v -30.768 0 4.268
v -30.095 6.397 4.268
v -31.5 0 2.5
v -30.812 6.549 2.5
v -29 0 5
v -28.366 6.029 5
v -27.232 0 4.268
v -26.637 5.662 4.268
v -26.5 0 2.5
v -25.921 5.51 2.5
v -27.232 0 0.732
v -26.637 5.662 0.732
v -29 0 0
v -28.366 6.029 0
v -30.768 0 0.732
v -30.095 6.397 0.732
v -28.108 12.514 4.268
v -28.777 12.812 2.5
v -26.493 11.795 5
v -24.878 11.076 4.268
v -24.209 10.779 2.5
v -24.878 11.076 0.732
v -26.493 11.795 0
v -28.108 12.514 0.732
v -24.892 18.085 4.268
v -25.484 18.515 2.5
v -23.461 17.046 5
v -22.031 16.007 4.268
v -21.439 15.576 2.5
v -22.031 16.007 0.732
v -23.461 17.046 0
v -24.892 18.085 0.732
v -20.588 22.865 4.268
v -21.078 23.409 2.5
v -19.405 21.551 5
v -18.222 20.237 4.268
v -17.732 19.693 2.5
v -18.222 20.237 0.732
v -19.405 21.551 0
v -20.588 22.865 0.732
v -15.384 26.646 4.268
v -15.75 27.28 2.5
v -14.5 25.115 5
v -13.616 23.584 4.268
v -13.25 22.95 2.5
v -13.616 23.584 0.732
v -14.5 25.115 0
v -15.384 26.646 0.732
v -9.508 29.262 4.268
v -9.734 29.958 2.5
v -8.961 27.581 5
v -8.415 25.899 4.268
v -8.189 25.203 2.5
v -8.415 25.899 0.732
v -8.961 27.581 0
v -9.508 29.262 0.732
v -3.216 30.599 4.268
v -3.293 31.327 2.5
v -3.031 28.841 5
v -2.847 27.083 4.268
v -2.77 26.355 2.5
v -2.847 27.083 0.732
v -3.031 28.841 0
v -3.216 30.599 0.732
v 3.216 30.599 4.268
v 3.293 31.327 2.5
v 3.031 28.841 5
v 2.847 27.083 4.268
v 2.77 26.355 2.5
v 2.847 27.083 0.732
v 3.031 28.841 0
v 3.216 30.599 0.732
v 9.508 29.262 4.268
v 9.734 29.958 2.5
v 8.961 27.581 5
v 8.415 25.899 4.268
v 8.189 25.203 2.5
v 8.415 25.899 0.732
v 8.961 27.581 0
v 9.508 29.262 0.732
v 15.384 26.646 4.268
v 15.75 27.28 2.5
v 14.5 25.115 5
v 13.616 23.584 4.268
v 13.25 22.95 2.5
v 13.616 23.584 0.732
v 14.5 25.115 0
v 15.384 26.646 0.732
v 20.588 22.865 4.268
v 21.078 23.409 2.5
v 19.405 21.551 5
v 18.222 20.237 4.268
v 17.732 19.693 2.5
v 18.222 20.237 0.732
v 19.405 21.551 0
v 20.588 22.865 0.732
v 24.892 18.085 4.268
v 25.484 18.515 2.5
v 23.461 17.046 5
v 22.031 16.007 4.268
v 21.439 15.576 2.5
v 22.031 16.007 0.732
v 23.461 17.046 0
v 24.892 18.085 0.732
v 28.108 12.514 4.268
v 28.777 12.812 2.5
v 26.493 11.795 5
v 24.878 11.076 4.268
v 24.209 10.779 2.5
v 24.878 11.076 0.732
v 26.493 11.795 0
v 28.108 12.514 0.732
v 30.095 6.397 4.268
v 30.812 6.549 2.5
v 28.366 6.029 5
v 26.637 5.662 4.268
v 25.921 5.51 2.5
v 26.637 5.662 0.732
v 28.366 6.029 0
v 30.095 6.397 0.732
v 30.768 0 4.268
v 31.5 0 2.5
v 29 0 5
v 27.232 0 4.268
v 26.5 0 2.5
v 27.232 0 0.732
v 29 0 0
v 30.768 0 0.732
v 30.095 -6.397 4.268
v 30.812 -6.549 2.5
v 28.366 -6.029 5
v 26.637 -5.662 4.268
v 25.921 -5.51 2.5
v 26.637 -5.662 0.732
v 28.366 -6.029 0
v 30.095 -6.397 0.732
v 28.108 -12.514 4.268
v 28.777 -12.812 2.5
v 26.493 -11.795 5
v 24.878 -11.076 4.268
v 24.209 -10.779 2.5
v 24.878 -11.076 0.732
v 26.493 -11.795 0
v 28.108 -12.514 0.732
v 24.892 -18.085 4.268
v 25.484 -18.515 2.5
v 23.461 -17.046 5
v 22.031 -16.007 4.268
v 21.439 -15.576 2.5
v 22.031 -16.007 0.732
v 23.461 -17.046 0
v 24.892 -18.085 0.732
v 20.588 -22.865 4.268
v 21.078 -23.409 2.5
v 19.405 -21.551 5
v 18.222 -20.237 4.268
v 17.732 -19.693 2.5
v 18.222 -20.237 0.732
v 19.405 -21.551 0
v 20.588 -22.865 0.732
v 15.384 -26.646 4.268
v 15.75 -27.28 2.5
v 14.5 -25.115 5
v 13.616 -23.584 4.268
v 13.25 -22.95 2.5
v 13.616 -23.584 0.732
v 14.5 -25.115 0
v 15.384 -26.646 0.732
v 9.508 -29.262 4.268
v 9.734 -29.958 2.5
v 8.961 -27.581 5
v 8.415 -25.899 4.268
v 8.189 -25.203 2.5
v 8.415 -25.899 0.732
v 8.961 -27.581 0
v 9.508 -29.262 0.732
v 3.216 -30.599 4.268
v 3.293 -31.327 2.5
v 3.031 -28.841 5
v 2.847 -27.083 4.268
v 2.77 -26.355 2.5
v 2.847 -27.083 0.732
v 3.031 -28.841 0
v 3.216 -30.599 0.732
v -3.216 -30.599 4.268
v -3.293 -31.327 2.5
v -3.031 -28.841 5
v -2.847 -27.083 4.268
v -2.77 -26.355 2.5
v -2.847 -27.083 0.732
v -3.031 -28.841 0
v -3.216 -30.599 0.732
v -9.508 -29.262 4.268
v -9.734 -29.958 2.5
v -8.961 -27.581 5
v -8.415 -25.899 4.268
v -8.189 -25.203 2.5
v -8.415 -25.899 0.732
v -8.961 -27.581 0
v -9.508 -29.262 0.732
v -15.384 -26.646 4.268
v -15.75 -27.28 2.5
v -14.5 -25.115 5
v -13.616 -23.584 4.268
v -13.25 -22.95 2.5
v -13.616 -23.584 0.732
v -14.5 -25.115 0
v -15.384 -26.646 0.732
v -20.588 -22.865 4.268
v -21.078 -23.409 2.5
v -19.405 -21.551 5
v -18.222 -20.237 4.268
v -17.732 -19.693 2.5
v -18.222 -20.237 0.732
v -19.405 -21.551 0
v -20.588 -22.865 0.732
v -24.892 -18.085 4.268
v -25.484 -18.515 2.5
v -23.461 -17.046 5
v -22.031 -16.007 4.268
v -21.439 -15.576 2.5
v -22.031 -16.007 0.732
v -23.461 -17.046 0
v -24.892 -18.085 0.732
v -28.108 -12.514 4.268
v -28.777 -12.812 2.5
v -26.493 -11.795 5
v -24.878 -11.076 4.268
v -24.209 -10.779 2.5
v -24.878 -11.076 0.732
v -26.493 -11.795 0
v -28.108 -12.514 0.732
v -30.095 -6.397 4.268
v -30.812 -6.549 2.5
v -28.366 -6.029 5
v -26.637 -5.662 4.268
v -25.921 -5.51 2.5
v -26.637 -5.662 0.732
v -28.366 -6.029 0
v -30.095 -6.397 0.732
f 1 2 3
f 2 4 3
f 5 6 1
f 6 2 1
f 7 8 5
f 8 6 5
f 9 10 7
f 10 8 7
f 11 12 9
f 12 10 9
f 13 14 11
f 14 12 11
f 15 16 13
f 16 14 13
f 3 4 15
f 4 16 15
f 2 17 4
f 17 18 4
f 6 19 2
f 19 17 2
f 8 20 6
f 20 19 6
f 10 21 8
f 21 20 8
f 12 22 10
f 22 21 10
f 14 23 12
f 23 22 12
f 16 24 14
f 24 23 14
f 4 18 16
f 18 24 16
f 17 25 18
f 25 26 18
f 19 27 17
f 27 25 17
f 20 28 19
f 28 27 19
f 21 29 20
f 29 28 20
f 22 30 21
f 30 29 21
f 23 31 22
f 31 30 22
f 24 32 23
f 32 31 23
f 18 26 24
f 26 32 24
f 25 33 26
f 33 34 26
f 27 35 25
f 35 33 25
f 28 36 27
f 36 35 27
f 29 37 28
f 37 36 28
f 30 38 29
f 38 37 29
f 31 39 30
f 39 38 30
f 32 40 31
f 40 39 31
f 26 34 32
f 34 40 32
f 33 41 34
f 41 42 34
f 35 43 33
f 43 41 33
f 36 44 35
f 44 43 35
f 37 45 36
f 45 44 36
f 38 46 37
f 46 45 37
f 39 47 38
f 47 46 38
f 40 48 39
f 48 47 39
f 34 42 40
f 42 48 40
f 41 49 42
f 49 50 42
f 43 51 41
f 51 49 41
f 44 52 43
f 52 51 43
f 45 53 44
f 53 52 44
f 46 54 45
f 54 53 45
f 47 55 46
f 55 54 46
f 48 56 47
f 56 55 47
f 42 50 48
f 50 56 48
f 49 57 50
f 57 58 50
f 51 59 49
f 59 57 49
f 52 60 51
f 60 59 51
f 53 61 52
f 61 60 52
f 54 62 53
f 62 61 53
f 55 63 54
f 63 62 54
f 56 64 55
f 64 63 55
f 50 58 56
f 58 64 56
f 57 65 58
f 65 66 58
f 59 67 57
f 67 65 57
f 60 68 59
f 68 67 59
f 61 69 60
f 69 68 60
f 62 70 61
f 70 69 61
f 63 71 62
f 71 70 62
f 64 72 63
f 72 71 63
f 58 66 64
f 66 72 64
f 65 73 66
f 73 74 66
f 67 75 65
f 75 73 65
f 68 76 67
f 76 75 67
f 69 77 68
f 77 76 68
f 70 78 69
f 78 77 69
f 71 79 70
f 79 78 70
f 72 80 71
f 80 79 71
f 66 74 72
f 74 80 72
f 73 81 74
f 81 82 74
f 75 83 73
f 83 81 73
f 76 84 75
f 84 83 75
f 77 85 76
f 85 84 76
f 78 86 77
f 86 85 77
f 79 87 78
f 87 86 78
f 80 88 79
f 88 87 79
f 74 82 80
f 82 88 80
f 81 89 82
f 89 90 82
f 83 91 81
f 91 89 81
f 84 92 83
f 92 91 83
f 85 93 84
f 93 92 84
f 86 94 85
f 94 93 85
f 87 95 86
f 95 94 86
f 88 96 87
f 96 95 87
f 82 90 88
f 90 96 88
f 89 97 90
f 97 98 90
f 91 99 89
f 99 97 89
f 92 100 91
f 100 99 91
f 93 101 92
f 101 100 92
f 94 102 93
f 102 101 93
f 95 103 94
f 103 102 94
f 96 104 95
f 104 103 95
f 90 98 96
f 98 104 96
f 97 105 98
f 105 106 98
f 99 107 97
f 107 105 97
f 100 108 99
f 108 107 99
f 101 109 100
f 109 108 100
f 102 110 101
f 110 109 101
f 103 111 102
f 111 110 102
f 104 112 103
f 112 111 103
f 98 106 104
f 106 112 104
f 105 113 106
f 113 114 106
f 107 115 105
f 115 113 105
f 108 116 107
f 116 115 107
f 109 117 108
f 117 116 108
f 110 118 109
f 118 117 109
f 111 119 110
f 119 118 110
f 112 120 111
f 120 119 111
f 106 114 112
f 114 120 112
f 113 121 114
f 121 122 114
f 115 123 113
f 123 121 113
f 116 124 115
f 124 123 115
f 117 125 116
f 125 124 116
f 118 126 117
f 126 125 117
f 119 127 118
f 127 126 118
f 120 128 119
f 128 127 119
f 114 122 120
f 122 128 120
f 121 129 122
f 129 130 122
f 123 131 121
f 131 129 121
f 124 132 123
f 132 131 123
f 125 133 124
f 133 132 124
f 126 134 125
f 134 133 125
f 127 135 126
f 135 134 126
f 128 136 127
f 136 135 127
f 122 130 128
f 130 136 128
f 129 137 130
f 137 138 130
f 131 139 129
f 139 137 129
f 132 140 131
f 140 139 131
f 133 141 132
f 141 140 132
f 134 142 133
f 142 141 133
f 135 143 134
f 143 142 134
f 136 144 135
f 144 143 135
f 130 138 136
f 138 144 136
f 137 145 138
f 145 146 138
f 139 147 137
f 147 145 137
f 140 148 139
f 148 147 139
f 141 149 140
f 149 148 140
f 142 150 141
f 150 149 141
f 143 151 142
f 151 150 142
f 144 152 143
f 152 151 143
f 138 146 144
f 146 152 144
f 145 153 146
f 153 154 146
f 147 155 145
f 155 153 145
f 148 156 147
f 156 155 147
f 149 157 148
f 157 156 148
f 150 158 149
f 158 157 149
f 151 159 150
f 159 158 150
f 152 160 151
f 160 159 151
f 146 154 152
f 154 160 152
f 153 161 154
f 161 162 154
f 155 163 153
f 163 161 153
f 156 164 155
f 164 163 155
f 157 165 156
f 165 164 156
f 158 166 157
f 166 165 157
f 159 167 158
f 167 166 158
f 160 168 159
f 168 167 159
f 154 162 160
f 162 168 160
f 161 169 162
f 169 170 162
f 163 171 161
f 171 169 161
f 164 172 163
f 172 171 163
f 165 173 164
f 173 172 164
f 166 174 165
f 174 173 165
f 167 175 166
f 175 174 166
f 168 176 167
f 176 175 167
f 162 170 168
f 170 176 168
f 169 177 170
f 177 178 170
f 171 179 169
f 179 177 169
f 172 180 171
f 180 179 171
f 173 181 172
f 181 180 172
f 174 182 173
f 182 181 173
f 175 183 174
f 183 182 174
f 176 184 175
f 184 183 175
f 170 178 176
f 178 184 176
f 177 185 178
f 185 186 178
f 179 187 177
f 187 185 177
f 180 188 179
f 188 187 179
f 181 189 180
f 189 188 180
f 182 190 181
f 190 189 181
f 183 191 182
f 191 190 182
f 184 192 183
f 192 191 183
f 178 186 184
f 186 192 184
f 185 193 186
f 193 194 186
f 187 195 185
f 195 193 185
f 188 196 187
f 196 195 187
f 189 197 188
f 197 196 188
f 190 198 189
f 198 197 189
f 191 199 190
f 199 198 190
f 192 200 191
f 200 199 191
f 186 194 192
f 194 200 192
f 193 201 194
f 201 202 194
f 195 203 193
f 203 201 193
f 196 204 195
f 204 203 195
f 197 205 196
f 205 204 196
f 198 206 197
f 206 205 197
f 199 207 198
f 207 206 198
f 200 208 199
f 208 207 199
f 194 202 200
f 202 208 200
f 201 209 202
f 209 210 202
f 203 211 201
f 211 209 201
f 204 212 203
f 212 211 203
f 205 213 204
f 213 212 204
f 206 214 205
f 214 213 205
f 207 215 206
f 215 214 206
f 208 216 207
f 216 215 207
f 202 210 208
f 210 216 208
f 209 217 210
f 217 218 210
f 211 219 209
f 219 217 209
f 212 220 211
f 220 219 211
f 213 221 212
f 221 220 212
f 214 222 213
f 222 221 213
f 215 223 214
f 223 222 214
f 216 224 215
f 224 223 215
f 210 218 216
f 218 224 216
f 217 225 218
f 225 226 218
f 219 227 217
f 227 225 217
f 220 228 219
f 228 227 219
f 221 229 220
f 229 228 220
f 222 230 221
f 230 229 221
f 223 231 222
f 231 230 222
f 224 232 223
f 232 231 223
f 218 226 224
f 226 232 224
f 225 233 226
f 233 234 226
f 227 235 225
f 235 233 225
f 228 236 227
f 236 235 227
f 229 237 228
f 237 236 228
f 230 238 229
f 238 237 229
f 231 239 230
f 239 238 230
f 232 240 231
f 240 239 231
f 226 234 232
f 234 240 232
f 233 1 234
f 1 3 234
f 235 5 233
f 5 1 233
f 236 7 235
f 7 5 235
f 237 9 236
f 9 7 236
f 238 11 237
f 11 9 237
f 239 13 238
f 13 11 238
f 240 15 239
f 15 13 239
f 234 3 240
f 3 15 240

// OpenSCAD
// NAME: O Ring 53
// CATEGORY: Wheel
// COLOR: 0

// Could be use O ring 50
module o_ring_53(){
    rotate_extrude(convexity =1)
        translate([55/2+1.5, 0, 0])
        circle(d = 5);
}

translate([0, 0, 2.5])
    color("black")
    o_ring_53();
